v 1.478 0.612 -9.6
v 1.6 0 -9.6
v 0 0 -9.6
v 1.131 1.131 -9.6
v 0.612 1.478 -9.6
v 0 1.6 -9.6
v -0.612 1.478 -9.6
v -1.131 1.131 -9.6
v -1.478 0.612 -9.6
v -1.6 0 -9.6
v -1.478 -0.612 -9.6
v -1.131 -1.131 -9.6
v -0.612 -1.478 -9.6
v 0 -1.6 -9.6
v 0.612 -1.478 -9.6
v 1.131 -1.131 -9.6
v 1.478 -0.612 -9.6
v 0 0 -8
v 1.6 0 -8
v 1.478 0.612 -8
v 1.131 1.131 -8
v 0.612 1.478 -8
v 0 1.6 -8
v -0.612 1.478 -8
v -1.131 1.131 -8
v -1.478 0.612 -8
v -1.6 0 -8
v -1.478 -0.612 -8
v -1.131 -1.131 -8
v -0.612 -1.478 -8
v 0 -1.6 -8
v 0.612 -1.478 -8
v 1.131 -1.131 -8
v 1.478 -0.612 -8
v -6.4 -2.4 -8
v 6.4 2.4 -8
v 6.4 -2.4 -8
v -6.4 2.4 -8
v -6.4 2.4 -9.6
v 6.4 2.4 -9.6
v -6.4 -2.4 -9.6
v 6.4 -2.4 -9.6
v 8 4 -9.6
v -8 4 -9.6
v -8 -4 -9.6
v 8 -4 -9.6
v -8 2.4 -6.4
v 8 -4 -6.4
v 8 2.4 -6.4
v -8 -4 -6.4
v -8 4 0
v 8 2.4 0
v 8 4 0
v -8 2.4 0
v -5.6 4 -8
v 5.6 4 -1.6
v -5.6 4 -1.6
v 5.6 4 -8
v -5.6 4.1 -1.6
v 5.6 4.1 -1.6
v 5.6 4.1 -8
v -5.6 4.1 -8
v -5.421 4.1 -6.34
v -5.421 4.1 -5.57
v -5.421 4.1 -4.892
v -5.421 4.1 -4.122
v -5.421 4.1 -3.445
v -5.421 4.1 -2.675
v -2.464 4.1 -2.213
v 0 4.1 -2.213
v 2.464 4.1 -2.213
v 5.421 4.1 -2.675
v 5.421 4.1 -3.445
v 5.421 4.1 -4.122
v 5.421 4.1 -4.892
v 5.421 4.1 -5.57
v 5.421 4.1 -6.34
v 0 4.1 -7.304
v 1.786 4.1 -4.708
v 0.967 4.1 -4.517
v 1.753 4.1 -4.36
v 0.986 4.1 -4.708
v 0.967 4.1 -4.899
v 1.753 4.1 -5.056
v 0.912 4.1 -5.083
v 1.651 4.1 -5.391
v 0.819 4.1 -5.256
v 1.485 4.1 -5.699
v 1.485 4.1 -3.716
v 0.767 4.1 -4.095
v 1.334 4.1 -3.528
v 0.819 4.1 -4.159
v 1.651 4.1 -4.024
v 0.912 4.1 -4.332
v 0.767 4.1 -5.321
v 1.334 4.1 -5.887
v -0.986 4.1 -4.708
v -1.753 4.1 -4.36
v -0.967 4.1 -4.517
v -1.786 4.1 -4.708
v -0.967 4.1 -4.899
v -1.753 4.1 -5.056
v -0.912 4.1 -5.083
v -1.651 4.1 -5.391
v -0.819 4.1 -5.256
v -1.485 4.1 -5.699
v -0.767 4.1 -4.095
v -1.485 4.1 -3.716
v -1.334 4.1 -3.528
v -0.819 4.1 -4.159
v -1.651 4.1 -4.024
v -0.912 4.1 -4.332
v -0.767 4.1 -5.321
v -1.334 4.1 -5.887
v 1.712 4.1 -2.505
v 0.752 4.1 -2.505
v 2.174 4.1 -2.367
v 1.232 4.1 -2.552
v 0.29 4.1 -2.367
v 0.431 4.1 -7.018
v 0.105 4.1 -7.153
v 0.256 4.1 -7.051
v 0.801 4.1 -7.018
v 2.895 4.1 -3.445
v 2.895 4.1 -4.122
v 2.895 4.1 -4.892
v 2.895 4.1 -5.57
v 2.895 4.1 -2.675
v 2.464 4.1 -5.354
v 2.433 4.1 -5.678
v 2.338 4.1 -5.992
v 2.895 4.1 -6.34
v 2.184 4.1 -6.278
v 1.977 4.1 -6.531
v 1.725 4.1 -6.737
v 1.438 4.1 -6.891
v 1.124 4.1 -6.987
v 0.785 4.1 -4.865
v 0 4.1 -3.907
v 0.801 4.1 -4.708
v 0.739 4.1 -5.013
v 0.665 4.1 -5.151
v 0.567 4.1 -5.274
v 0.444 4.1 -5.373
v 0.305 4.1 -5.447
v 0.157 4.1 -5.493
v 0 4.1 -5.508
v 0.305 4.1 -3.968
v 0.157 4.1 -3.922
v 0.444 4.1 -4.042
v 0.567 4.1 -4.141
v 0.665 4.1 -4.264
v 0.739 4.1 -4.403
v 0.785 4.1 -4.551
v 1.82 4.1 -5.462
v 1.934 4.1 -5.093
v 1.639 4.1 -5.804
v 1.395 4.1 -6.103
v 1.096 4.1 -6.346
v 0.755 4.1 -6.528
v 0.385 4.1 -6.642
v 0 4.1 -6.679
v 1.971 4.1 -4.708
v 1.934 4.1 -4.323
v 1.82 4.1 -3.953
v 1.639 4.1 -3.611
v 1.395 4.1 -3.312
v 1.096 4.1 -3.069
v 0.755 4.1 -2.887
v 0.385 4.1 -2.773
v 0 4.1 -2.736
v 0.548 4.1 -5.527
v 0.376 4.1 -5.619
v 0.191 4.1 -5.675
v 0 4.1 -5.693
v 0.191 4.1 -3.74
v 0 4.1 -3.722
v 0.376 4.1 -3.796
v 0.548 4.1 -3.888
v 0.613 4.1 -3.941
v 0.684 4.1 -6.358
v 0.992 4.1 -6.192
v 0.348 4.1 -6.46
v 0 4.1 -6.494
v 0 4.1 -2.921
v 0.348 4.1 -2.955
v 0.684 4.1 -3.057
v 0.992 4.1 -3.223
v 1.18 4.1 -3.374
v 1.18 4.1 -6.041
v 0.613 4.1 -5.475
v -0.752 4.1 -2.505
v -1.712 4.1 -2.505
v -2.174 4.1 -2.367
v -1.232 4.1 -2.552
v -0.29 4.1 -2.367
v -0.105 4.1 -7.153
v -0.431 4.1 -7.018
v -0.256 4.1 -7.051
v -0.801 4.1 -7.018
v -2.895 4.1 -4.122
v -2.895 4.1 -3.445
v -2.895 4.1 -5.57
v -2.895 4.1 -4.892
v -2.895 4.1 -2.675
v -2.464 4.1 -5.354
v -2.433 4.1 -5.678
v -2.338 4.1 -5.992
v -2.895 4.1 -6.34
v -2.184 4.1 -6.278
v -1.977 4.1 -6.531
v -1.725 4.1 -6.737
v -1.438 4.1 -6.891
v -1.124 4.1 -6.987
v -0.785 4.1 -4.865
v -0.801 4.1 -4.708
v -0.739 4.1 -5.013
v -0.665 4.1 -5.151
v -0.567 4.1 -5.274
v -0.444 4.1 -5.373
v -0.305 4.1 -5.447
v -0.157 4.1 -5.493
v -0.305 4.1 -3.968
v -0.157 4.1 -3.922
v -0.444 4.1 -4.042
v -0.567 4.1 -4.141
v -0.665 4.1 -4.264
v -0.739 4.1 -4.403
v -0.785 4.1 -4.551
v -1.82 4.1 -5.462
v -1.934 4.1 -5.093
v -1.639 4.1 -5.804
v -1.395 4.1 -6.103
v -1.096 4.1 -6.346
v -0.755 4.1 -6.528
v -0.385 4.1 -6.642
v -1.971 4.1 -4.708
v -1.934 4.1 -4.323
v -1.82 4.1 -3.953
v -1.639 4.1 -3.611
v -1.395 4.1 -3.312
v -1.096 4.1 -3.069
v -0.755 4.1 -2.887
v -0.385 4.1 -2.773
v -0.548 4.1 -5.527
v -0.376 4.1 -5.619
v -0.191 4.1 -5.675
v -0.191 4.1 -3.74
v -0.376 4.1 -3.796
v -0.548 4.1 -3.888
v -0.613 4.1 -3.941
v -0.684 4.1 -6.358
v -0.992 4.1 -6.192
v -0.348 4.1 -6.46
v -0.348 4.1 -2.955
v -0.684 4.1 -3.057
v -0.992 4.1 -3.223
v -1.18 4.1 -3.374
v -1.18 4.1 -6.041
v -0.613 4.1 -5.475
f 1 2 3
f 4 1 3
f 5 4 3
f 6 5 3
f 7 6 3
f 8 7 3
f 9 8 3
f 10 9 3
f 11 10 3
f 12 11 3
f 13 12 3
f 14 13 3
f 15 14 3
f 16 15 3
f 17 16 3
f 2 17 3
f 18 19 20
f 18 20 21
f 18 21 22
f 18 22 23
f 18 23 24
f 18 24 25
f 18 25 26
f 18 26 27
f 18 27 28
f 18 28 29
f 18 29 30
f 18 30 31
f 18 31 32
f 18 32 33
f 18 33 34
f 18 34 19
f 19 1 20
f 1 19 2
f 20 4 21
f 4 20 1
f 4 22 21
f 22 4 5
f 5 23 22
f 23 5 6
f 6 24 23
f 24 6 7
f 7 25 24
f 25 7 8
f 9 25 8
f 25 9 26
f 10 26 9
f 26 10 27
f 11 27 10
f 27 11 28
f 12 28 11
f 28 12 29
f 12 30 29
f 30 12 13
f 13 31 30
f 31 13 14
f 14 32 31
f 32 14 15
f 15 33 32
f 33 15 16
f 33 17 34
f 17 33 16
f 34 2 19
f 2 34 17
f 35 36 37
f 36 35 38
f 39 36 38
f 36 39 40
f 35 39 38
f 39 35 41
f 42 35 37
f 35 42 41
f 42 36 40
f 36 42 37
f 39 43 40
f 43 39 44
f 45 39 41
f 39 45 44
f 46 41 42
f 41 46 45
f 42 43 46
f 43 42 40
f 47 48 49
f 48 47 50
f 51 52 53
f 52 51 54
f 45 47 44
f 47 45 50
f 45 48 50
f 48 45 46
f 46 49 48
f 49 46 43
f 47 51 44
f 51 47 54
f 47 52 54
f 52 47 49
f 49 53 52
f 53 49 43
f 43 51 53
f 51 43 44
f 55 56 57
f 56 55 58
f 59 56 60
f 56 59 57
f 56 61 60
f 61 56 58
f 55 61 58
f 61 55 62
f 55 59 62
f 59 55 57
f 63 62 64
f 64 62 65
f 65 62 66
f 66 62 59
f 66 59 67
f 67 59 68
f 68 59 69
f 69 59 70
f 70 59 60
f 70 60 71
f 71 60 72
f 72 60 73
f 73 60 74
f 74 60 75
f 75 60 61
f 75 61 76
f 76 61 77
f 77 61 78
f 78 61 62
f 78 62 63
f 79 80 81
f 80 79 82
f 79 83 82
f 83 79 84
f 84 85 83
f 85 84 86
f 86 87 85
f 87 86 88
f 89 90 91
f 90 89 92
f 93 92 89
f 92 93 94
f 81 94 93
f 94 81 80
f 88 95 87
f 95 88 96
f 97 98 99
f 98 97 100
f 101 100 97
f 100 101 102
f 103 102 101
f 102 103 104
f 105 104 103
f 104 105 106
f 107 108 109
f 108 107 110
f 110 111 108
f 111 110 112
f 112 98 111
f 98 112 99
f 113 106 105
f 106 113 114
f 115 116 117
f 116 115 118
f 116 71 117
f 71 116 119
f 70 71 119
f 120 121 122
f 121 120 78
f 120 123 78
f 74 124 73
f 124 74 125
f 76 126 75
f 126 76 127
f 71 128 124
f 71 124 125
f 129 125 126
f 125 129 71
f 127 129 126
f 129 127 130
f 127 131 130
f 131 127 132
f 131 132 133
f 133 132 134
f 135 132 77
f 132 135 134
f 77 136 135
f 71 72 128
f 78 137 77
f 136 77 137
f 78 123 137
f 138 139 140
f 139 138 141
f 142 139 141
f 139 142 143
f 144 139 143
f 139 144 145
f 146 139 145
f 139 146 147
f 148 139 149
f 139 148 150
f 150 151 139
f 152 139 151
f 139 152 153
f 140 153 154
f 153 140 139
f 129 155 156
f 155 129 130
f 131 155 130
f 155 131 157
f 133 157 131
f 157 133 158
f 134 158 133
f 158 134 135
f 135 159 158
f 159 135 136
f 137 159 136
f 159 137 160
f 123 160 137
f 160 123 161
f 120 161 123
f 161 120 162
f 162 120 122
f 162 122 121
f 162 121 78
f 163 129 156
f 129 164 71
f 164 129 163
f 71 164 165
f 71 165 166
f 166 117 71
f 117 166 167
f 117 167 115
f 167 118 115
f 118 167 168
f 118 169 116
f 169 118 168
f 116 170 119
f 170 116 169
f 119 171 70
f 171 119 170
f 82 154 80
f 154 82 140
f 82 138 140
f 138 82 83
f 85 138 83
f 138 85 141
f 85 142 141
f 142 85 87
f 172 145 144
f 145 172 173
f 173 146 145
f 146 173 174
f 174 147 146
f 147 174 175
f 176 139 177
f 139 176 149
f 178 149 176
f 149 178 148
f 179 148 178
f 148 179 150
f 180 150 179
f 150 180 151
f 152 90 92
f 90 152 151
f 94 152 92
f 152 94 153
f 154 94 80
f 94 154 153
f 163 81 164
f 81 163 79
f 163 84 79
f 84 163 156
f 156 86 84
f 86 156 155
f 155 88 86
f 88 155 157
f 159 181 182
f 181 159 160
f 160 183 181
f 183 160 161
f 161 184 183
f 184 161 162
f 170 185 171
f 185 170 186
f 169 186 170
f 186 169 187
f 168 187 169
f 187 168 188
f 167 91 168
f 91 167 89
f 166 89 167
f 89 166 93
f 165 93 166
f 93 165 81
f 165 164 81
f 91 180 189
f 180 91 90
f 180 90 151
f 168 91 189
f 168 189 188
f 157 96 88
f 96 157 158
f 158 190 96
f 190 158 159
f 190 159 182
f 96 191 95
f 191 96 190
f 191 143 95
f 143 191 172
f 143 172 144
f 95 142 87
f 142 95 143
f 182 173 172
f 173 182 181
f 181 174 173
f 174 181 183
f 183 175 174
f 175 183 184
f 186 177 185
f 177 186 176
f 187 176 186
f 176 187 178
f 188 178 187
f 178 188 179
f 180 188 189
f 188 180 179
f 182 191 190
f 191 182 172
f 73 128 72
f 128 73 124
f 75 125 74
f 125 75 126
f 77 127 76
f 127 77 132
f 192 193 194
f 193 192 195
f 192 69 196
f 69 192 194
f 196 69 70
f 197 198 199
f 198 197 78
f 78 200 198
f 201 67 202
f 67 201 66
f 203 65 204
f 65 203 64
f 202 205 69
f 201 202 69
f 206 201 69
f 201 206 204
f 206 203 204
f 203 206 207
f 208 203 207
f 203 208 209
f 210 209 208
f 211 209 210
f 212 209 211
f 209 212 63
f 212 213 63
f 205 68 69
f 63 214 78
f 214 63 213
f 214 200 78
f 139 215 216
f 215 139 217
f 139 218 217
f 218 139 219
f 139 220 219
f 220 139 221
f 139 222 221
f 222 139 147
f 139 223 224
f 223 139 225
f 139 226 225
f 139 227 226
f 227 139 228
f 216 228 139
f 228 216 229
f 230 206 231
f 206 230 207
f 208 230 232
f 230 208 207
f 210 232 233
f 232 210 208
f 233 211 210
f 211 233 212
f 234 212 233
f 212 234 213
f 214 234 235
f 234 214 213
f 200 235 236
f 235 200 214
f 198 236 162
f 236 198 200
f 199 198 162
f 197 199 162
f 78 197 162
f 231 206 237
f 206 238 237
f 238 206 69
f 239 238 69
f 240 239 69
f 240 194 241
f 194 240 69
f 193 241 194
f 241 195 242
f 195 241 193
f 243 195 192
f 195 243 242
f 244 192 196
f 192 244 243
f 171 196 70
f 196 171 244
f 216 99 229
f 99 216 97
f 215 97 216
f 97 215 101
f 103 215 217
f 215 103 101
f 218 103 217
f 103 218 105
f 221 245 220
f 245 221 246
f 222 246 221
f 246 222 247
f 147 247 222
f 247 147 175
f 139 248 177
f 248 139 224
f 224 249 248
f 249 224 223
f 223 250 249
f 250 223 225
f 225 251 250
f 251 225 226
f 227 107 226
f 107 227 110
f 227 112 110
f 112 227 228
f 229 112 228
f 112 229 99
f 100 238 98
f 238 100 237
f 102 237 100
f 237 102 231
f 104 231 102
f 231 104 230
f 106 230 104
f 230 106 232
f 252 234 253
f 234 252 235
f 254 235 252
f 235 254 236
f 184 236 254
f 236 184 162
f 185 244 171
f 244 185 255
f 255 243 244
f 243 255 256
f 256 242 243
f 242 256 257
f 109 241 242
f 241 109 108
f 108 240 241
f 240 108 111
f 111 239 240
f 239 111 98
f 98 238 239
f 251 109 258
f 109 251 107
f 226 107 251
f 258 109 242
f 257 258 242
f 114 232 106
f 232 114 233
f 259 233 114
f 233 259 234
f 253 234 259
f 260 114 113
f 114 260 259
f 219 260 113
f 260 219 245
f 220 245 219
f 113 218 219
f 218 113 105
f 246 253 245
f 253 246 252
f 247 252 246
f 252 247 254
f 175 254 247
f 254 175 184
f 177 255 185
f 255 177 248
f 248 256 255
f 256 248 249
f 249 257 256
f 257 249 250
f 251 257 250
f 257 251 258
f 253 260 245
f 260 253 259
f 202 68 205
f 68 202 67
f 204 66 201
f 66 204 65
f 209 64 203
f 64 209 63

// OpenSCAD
// file: ../p/4-4edge.scad
use <../lib.scad>
function ldraw_lib__4_4edge() = [
// 0 Circle 1.0
// 0 Name: 4-4edge.dat
// 0 Author: James Jessiman
// 0 !LDRAW_ORG Primitive UPDATE 2017-01
// 0 !LICENSE Licensed under CC BY 2.0 and CC BY 4.0 : see CAreadme.txt
// 
// 0 BFC CERTIFY CCW
  [0,"BFC","CERTIFY"],
  [0,"BFC","CCW"],
// 
// 0 !HISTORY 1998-12-15 [PTadmin] Official Update 1998-10
// 0 !HISTORY 2005-12-28 [PTadmin] Official Update 2005-01
// 0 !HISTORY 2007-06-24 [PTadmin] Header formatted for Contributor Agreement
// 0 !HISTORY 2008-07-01 [PTadmin] Official Update 2008-01
// 0 !HISTORY 2017-01-15 [Steffen] BFCed
// 0 !HISTORY 2017-12-30 [PTadmin] Official Update 2017-01
// 
// 
// 2 24 1 0 0 0.9239 0 0.3827
  [2,24,1,0,0,0.9239,0,0.3827],
// 2 24 0.9239 0 0.3827 0.7071 0 0.7071
  [2,24,0.9239,0,0.3827,0.7071,0,0.7071],
// 2 24 0.7071 0 0.7071 0.3827 0 0.9239
  [2,24,0.7071,0,0.7071,0.3827,0,0.9239],
// 2 24 0.3827 0 0.9239 0 0 1
  [2,24,0.3827,0,0.9239,0,0,1],
// 2 24 0 0 1 -0.3827 0 0.9239
  [2,24,0,0,1,-0.3827,0,0.9239],
// 2 24 -0.3827 0 0.9239 -0.7071 0 0.7071
  [2,24,-0.3827,0,0.9239,-0.7071,0,0.7071],
// 2 24 -0.7071 0 0.7071 -0.9239 0 0.3827
  [2,24,-0.7071,0,0.7071,-0.9239,0,0.3827],
// 2 24 -0.9239 0 0.3827 -1 0 -0
  [2,24,-0.9239,0,0.3827,-1,0,-0],
// 2 24 -1 0 -0 -0.9239 0 -0.3827
  [2,24,-1,0,-0,-0.9239,0,-0.3827],
// 2 24 -0.9239 0 -0.3827 -0.7071 0 -0.7071
  [2,24,-0.9239,0,-0.3827,-0.7071,0,-0.7071],
// 2 24 -0.7071 0 -0.7071 -0.3827 0 -0.9239
  [2,24,-0.7071,0,-0.7071,-0.3827,0,-0.9239],
// 2 24 -0.3827 0 -0.9239 0 0 -1
  [2,24,-0.3827,0,-0.9239,0,0,-1],
// 2 24 0 0 -1 0.3827 0 -0.9239
  [2,24,0,0,-1,0.3827,0,-0.9239],
// 2 24 0.3827 0 -0.9239 0.7071 0 -0.7071
  [2,24,0.3827,0,-0.9239,0.7071,0,-0.7071],
// 2 24 0.7071 0 -0.7071 0.9239 0 -0.3827
  [2,24,0.7071,0,-0.7071,0.9239,0,-0.3827],
// 2 24 0.9239 0 -0.3827 1 0 0
  [2,24,0.9239,0,-0.3827,1,0,0],
];
module ldraw_lib__4_4edge(step=0, col=false, unit=2/5, alt=false, line=0.2, solid=!$preview)
    makepoly(ldraw_lib__4_4edge(), step=step, col=col, unit=unit, alt=alt, line=line, solid=solid);
ldraw_lib__4_4edge(line=0.2);
// file: ../p/4-4disc.scad
use <../lib.scad>
function ldraw_lib__4_4disc() = [
// 0 Disc 1.0
// 0 Name: 4-4disc.dat
// 0 Author: James Jessiman
// 0 !LDRAW_ORG Primitive UPDATE 2002-02
// 0 !LICENSE Licensed under CC BY 2.0 and CC BY 4.0 : see CAreadme.txt
// 
// 0 BFC CERTIFY CCW
  [0,"BFC","CERTIFY"],
  [0,"BFC","CCW"],
// 
// 0 !HISTORY 1998-12-15 [PTadmin] Official Update 1998-10
// 0 !HISTORY 2002-03-23 [sbliss] Added BFC statement
// 0 !HISTORY 2002-04-25 [PTadmin] Official Update 2002-02
// 0 !HISTORY 2007-06-24 [PTadmin] Header formatted for Contributor Agreement
// 0 !HISTORY 2008-07-01 [PTadmin] Official Update 2008-01
// 
// 
// 3 16 0 0 0 1 0 0 0.9239 0 0.3827
  [3,16,0,0,0,1,0,0,0.9239,0,0.3827],
// 3 16 0 0 0 0.9239 0 0.3827 0.7071 0 0.7071
  [3,16,0,0,0,0.9239,0,0.3827,0.7071,0,0.7071],
// 3 16 0 0 0 0.7071 0 0.7071 0.3827 0 0.9239
  [3,16,0,0,0,0.7071,0,0.7071,0.3827,0,0.9239],
// 3 16 0 0 0 0.3827 0 0.9239 0 0 1
  [3,16,0,0,0,0.3827,0,0.9239,0,0,1],
// 3 16 0 0 0 0 0 1 -0.3827 0 0.9239
  [3,16,0,0,0,0,0,1,-0.3827,0,0.9239],
// 3 16 0 0 0 -0.3827 0 0.9239 -0.7071 0 0.7071
  [3,16,0,0,0,-0.3827,0,0.9239,-0.7071,0,0.7071],
// 3 16 0 0 0 -0.7071 0 0.7071 -0.9239 0 0.3827
  [3,16,0,0,0,-0.7071,0,0.7071,-0.9239,0,0.3827],
// 3 16 0 0 0 -0.9239 0 0.3827 -1 0 -0
  [3,16,0,0,0,-0.9239,0,0.3827,-1,0,-0],
// 3 16 0 0 0 -1 0 -0 -0.9239 0 -0.3827
  [3,16,0,0,0,-1,0,-0,-0.9239,0,-0.3827],
// 3 16 0 0 0 -0.9239 0 -0.3827 -0.7071 0 -0.7071
  [3,16,0,0,0,-0.9239,0,-0.3827,-0.7071,0,-0.7071],
// 3 16 0 0 0 -0.7071 0 -0.7071 -0.3827 0 -0.9239
  [3,16,0,0,0,-0.7071,0,-0.7071,-0.3827,0,-0.9239],
// 3 16 0 0 0 -0.3827 0 -0.9239 0 0 -1
  [3,16,0,0,0,-0.3827,0,-0.9239,0,0,-1],
// 3 16 0 0 0 0 0 -1 0.3827 0 -0.9239
  [3,16,0,0,0,0,0,-1,0.3827,0,-0.9239],
// 3 16 0 0 0 0.3827 0 -0.9239 0.7071 0 -0.7071
  [3,16,0,0,0,0.3827,0,-0.9239,0.7071,0,-0.7071],
// 3 16 0 0 0 0.7071 0 -0.7071 0.9239 0 -0.3827
  [3,16,0,0,0,0.7071,0,-0.7071,0.9239,0,-0.3827],
// 3 16 0 0 0 0.9239 0 -0.3827 1 0 0
  [3,16,0,0,0,0.9239,0,-0.3827,1,0,0],
// 0
];
module ldraw_lib__4_4disc(step=0, col=false, unit=2/5, alt=false, line=0.2, solid=!$preview)
    makepoly(ldraw_lib__4_4disc(), step=step, col=col, unit=unit, alt=alt, line=line, solid=solid);
ldraw_lib__4_4disc(line=0.2);
// file: ../p/4-4cyli.scad
use <../lib.scad>
$fa=1; $fs=0.2;
function ldraw_lib__4_4cyli(realsolid=false) = [
// 0 Cylinder 1.0
// 0 Name: 4-4cyli.dat
// 0 Author: James Jessiman
// 0 !LDRAW_ORG Primitive UPDATE 2005-01
// 0 !LICENSE Licensed under CC BY 2.0 and CC BY 4.0 : see CAreadme.txt
// 
// 0 BFC CERTIFY CCW
  [0,"BFC","CERTIFY"],
  [0,"BFC","CCW"],
// 
// 0 !HISTORY 1998-12-15 [PTadmin] Official Update 1998-10
// 0 !HISTORY 2002-03-23 [sbliss] Added BFC statement; merged headers from files in distributions LDraw 0.27 and Complete.
// 0 !HISTORY 2002-04-25 [PTadmin] Official Update 2002-02
// 0 !HISTORY 2004-12-14 [guyvivan] BFC CCW
// 0 !HISTORY 2005-12-28 [PTadmin] Official Update 2005-01
// 0 !HISTORY 2007-06-24 [PTadmin] Header formatted for Contributor Agreement
// 0 !HISTORY 2008-07-01 [PTadmin] Official Update 2008-01
// 
// 
// 4 16 1 1 0 0.9239 1 0.3827 0.9239 0 0.3827 1 0 0
  [4,16,1,1,0,0.9239,1,0.3827,0.9239,0,0.3827,1,0,0],
// 5 24 1 0 0 1 1 0 0.9239 0 0.3827 0.9239 0 -0.3827
  [5,24,1,0,0,1,1,0,0.9239,0,0.3827,0.9239,0,-0.3827],
// 4 16 0.9239 1 0.3827 0.7071 1 0.7071 0.7071 0 0.7071 0.9239 0 0.3827
  [4,16,0.9239,1,0.3827,0.7071,1,0.7071,0.7071,0,0.7071,0.9239,0,0.3827],
// 5 24 0.9239 0 0.3827 0.9239 1 0.3827 0.7071 0 0.7071 1 0 0
  [5,24,0.9239,0,0.3827,0.9239,1,0.3827,0.7071,0,0.7071,1,0,0],
// 4 16 0.7071 1 0.7071 0.3827 1 0.9239 0.3827 0 0.9239 0.7071 0 0.7071
  [4,16,0.7071,1,0.7071,0.3827,1,0.9239,0.3827,0,0.9239,0.7071,0,0.7071],
// 5 24 0.7071 0 0.7071 0.7071 1 0.7071 0.3827 0 0.9239 0.9239 0 0.3827
  [5,24,0.7071,0,0.7071,0.7071,1,0.7071,0.3827,0,0.9239,0.9239,0,0.3827],
// 4 16 0.3827 1 0.9239 0 1 1 0 0 1 0.3827 0 0.9239
  [4,16,0.3827,1,0.9239,0,1,1,0,0,1,0.3827,0,0.9239],
// 5 24 0.3827 0 0.9239 0.3827 1 0.9239 0 0 1 0.7071 0 0.7071
  [5,24,0.3827,0,0.9239,0.3827,1,0.9239,0,0,1,0.7071,0,0.7071],
// 4 16 0 1 1 -0.3827 1 0.9239 -0.3827 0 0.9239 0 0 1
  [4,16,0,1,1,-0.3827,1,0.9239,-0.3827,0,0.9239,0,0,1],
// 5 24 0 0 1 0 1 1 -0.3827 0 0.9239 0.3827 0 0.9239
  [5,24,0,0,1,0,1,1,-0.3827,0,0.9239,0.3827,0,0.9239],
// 4 16 -0.3827 1 0.9239 -0.7071 1 0.7071 -0.7071 0 0.7071 -0.3827 0 0.9239
  [4,16,-0.3827,1,0.9239,-0.7071,1,0.7071,-0.7071,0,0.7071,-0.3827,0,0.9239],
// 5 24 -0.3827 0 0.9239 -0.3827 1 0.9239 -0.7071 0 0.7071 0 0 1
  [5,24,-0.3827,0,0.9239,-0.3827,1,0.9239,-0.7071,0,0.7071,0,0,1],
// 4 16 -0.7071 1 0.7071 -0.9239 1 0.3827 -0.9239 0 0.3827 -0.7071 0 0.7071
  [4,16,-0.7071,1,0.7071,-0.9239,1,0.3827,-0.9239,0,0.3827,-0.7071,0,0.7071],
// 5 24 -0.7071 0 0.7071 -0.7071 1 0.7071 -0.9239 0 0.3827 -0.3827 0 0.9239
  [5,24,-0.7071,0,0.7071,-0.7071,1,0.7071,-0.9239,0,0.3827,-0.3827,0,0.9239],
// 4 16 -0.9239 1 0.3827 -1 1 0 -1 0 0 -0.9239 0 0.3827
  [4,16,-0.9239,1,0.3827,-1,1,0,-1,0,0,-0.9239,0,0.3827],
// 5 24 -0.9239 0 0.3827 -0.9239 1 0.3827 -1 0 0 -0.7071 0 0.7071
  [5,24,-0.9239,0,0.3827,-0.9239,1,0.3827,-1,0,0,-0.7071,0,0.7071],
// 4 16 -1 1 0 -0.9239 1 -0.3827 -0.9239 0 -0.3827 -1 0 0
  [4,16,-1,1,0,-0.9239,1,-0.3827,-0.9239,0,-0.3827,-1,0,0],
// 5 24 -1 0 0 -1 1 0 -0.9239 0 -0.3827 -0.9239 0 0.3827
  [5,24,-1,0,0,-1,1,0,-0.9239,0,-0.3827,-0.9239,0,0.3827],
// 4 16 -0.9239 1 -0.3827 -0.7071 1 -0.7071 -0.7071 0 -0.7071 -0.9239 0 -0.3827
  [4,16,-0.9239,1,-0.3827,-0.7071,1,-0.7071,-0.7071,0,-0.7071,-0.9239,0,-0.3827],
// 5 24 -0.9239 0 -0.3827 -0.9239 1 -0.3827 -0.7071 0 -0.7071 -1 0 0
  [5,24,-0.9239,0,-0.3827,-0.9239,1,-0.3827,-0.7071,0,-0.7071,-1,0,0],
// 4 16 -0.7071 1 -0.7071 -0.3827 1 -0.9239 -0.3827 0 -0.9239 -0.7071 0 -0.7071
  [4,16,-0.7071,1,-0.7071,-0.3827,1,-0.9239,-0.3827,0,-0.9239,-0.7071,0,-0.7071],
// 5 24 -0.7071 0 -0.7071 -0.7071 1 -0.7071 -0.3827 0 -0.9239 -0.9239 0 -0.3827
  [5,24,-0.7071,0,-0.7071,-0.7071,1,-0.7071,-0.3827,0,-0.9239,-0.9239,0,-0.3827],
// 4 16 -0.3827 1 -0.9239 0 1 -1 0 0 -1 -0.3827 0 -0.9239
  [4,16,-0.3827,1,-0.9239,0,1,-1,0,0,-1,-0.3827,0,-0.9239],
// 5 24 -0.3827 0 -0.9239 -0.3827 1 -0.9239 0 0 -1 -0.7071 0 -0.7071
  [5,24,-0.3827,0,-0.9239,-0.3827,1,-0.9239,0,0,-1,-0.7071,0,-0.7071],
// 4 16 0 1 -1 0.3827 1 -0.9239 0.3827 0 -0.9239 0 0 -1
  [4,16,0,1,-1,0.3827,1,-0.9239,0.3827,0,-0.9239,0,0,-1],
// 5 24 0 0 -1 0 1 -1 0.3827 0 -0.9239 -0.3827 0 -0.9239
  [5,24,0,0,-1,0,1,-1,0.3827,0,-0.9239,-0.3827,0,-0.9239],
// 4 16 0.3827 1 -0.9239 0.7071 1 -0.7071 0.7071 0 -0.7071 0.3827 0 -0.9239
  [4,16,0.3827,1,-0.9239,0.7071,1,-0.7071,0.7071,0,-0.7071,0.3827,0,-0.9239],
// 5 24 0.3827 0 -0.9239 0.3827 1 -0.9239 0.7071 0 -0.7071 0 0 -1
  [5,24,0.3827,0,-0.9239,0.3827,1,-0.9239,0.7071,0,-0.7071,0,0,-1],
// 4 16 0.7071 1 -0.7071 0.9239 1 -0.3827 0.9239 0 -0.3827 0.7071 0 -0.7071
  [4,16,0.7071,1,-0.7071,0.9239,1,-0.3827,0.9239,0,-0.3827,0.7071,0,-0.7071],
// 5 24 0.7071 0 -0.7071 0.7071 1 -0.7071 0.9239 0 -0.3827 0.3827 0 -0.9239
  [5,24,0.7071,0,-0.7071,0.7071,1,-0.7071,0.9239,0,-0.3827,0.3827,0,-0.9239],
// 4 16 0.9239 1 -0.3827 1 1 0 1 0 0 0.9239 0 -0.3827
  [4,16,0.9239,1,-0.3827,1,1,0,1,0,0,0.9239,0,-0.3827],
// 5 24 0.9239 0 -0.3827 0.9239 1 -0.3827 1 0 0 0.7071 0 -0.7071
  [5,24,0.9239,0,-0.3827,0.9239,1,-0.3827,1,0,0,0.7071,0,-0.7071],
// 0
];
module ldraw_lib__4_4cyli(step=0, col=false, unit=2/5, alt=false, line=0.2, solid=!$preview)
    makepoly(ldraw_lib__4_4cyli(solid), step=step, col=col, unit=unit, alt=alt, line=line, solid=solid);
ldraw_lib__4_4cyli(line=0.2);
// file: ../p/stud3.scad
use <../lib.scad>
use <4-4cyli.scad>
use <4-4disc.scad>
use <4-4edge.scad>
function ldraw_lib__stud3() = [
// 0 Stud Tube Solid
// 0 Name: stud3.dat
// 0 Author: James Jessiman
// 0 !LDRAW_ORG Primitive UPDATE 2012-01
// 0 !LICENSE Licensed under CC BY 4.0 : see CAreadme.txt
// 
// 0 BFC CERTIFY CCW
  [0,"BFC","CERTIFY"],
  [0,"BFC","CCW"],
// 
// 0 !HISTORY 2002-04-04 [sbliss] Modified for BFC compliance
// 0 !HISTORY 2002-04-25 [PTadmin] Official Update 2002-02
// 0 !HISTORY 2007-06-24 [PTadmin] Header formatted for Contributor Agreement
// 0 !HISTORY 2008-07-01 [PTadmin] Official Update 2008-01
// 0 !HISTORY 2012-02-16 [Philo] Changed to CCW
// 0 !HISTORY 2012-03-30 [PTadmin] Official Update 2012-01
// 
// 
// 1 16 0 -4 0 4 0 0 0 1 0 0 0 4 4-4edge.dat
  [1,16,0,-4,0,4,0,0,0,1,0,0,0,4, ldraw_lib__4_4edge()],
// 1 16 0 0 0 4 0 0 0 1 0 0 0 4 4-4edge.dat
  [1,16,0,0,0,4,0,0,0,1,0,0,0,4, ldraw_lib__4_4edge()],
// 1 16 0 -4 0 4 0 0 0 1 0 0 0 4 4-4disc.dat
  [1,16,0,-4,0,4,0,0,0,1,0,0,0,4, ldraw_lib__4_4disc()],
  [-1,16,0,0,0,4,0,0,0,-1,0,0,0,4, ldraw_lib__4_4disc()],
// 1 16 0 -4 0 4 0 0 0 4 0 0 0 4 4-4cyli.dat
  [1,16,0,-4,0,4,0,0,0,4,0,0,0,4, ldraw_lib__4_4cyli()],
];
module ldraw_lib__stud3(step=0, col=false, unit=2/5, alt=false, line=0.2, solid=!$preview)
    makepoly(ldraw_lib__stud3(), step=step, col=col, unit=unit, alt=alt, line=line, solid=solid);
ldraw_lib__stud3(line=0.2);
// file: ../p/box5.scad
use <../lib.scad>
function ldraw_lib__box5() = [
// 0 Box with 5 Faces and All Edges
// 0 Name: box5.dat
// 0 Author: James Jessiman
// 0 !LDRAW_ORG Primitive UPDATE 2012-01
// 0 !LICENSE Licensed under CC BY 2.0 and CC BY 4.0 : see CAreadme.txt
// 
// 0 BFC CERTIFY CCW
  [0,"BFC","CERTIFY"],
  [0,"BFC","CCW"],
// 
// 0 !HISTORY 2002-04-03 [sbliss] Modified for BFC compliance
// 0 !HISTORY 2002-04-25 [PTadmin] Official Update 2002-02
// 0 !HISTORY 2007-06-24 [PTadmin] Header formatted for Contributor Agreement
// 0 !HISTORY 2008-07-01 [PTadmin] Official Update 2008-01
// 0 !HISTORY 2012-02-16 [Philo] Changed to CCW
// 0 !HISTORY 2012-03-30 [PTadmin] Official Update 2012-01
// 
// 
// 2 24 1 1 1 -1 1 1
  [2,24,1,1,1,-1,1,1],
// 2 24 -1 1 1 -1 1 -1
  [2,24,-1,1,1,-1,1,-1],
// 2 24 -1 1 -1 1 1 -1
  [2,24,-1,1,-1,1,1,-1],
// 2 24 1 1 -1 1 1 1
  [2,24,1,1,-1,1,1,1],
// 2 24 1 0 1 -1 0 1
  [2,24,1,0,1,-1,0,1],
// 2 24 -1 0 1 -1 0 -1
  [2,24,-1,0,1,-1,0,-1],
// 2 24 -1 0 -1 1 0 -1
  [2,24,-1,0,-1,1,0,-1],
// 2 24 1 0 -1 1 0 1
  [2,24,1,0,-1,1,0,1],
// 2 24 1 0 1 1 1 1
  [2,24,1,0,1,1,1,1],
// 2 24 -1 0 1 -1 1 1
  [2,24,-1,0,1,-1,1,1],
// 2 24 1 0 -1 1 1 -1
  [2,24,1,0,-1,1,1,-1],
// 2 24 -1 0 -1 -1 1 -1
  [2,24,-1,0,-1,-1,1,-1],
// 4 16 -1 1 1 1 1 1 1 1 -1 -1 1 -1
  [4,16,-1,1,1,1,1,1,1,1,-1,-1,1,-1],
// 4 16 -1 1 1 -1 0 1 1 0 1 1 1 1
  [4,16,-1,1,1,-1,0,1,1,0,1,1,1,1],
// 4 16 -1 1 -1 -1 0 -1 -1 0 1 -1 1 1
  [4,16,-1,1,-1,-1,0,-1,-1,0,1,-1,1,1],
// 4 16 1 1 -1 1 0 -1 -1 0 -1 -1 1 -1
  [4,16,1,1,-1,1,0,-1,-1,0,-1,-1,1,-1],
// 4 16 1 1 1 1 0 1 1 0 -1 1 1 -1
  [4,16,1,1,1,1,0,1,1,0,-1,1,1,-1],
];
makepoly(ldraw_lib__box5(), line=0.2);
// file: s/4865as01.scad
use <../../lib.scad>
use <../../p/box5.scad>
use <../../p/stud3.scad>
function ldraw_lib__s__4865as01() = [
// 0 ~Panel  1 x  2 x  1 without Front Face
// 0 Name: s\4865as01.dat
// 0 Author: James Jessiman
// 0 !LDRAW_ORG Subpart UPDATE 2020-03
// 0 !LICENSE Licensed under CC BY 2.0 and CC BY 4.0 : see CAreadme.txt
// 
// 0 BFC CERTIFY CCW
  [0,"BFC","CERTIFY"],
  [0,"BFC","CCW"],
// 
// 0 !HISTORY 2003-07-03 [Steffen] BFCed, subfiled
// 0 !HISTORY 2004-04-22 [PTadmin] Official Update 2004-02
// 0 !HISTORY 2007-09-10 [PTadmin] Header formatted for Contributor Agreement
// 0 !HISTORY 2008-07-01 [PTadmin] Official Update 2008-01
// 0 !HISTORY 2020-07-14 [PTadmin] Renamed from s/4865s01
// 0 !HISTORY 2020-12-29 [PTadmin] Official Update 2020-03
// 
// 
// 1 16 0 20 0 1 0 0 0 -1 0 0 0 1 stud3.dat
  [1,16,0,20,0,1,0,0,0,-1,0,0,0,1, ldraw_lib__stud3()],
// 0 BFC INVERTNEXT
  [0,"BFC","INVERTNEXT"],
// 1 16 0 24 0 16 0 0 0 -4 0 0 0 6 box5.dat
  [1,16,0,24,0,16,0,0,0,-4,0,0,0,6, ldraw_lib__box5()],
// 4 16 20 24 10 16 24 6 -16 24 6 -20 24 10
  [4,16,20,24,10,16,24,6,-16,24,6,-20,24,10],
// 4 16 -20 24 10 -16 24 6 -16 24 -6 -20 24 -10
  [4,16,-20,24,10,-16,24,6,-16,24,-6,-20,24,-10],
// 4 16 -20 24 -10 -16 24 -6 16 24 -6 20 24 -10
  [4,16,-20,24,-10,-16,24,-6,16,24,-6,20,24,-10],
// 4 16 20 24 -10 16 24 -6 16 24 6 20 24 10
  [4,16,20,24,-10,16,24,-6,16,24,6,20,24,10],
// 2 24 20 24 10 -20 24 10
  [2,24,20,24,10,-20,24,10],
// 2 24 -20 24 10 -20 24 -10
  [2,24,-20,24,10,-20,24,-10],
// 2 24 -20 24 -10 20 24 -10
  [2,24,-20,24,-10,20,24,-10],
// 2 24 20 24 -10 20 24 10
  [2,24,20,24,-10,20,24,10],
// 2 24 20 16 6 -20 16 6
  [2,24,20,16,6,-20,16,6],
// 2 24 -20 16 6 -20 16 -10
  [2,24,-20,16,6,-20,16,-10],
// 2 24 -20 16 -10 20 16 -10
  [2,24,-20,16,-10,20,16,-10],
// 2 24 20 16 -10 20 16 6
  [2,24,20,16,-10,20,16,6],
// 2 24 20 0 10 -20 0 10
  [2,24,20,0,10,-20,0,10],
// 2 24 -20 0 10 -20 0 6
  [2,24,-20,0,10,-20,0,6],
// 2 24 -20 0 6 20 0 6
  [2,24,-20,0,6,20,0,6],
// 2 24 20 0 6 20 0 10
  [2,24,20,0,6,20,0,10],
// 2 24 20 0 6 20 16 6
  [2,24,20,0,6,20,16,6],
// 2 24 -20 0 6 -20 16 6
  [2,24,-20,0,6,-20,16,6],
// 2 24 20 16 -10 20 24 -10
  [2,24,20,16,-10,20,24,-10],
// 2 24 -20 16 -10 -20 24 -10
  [2,24,-20,16,-10,-20,24,-10],
// 2 24 20 0 10 20 24 10
  [2,24,20,0,10,20,24,10],
// 2 24 -20 0 10 -20 24 10
  [2,24,-20,0,10,-20,24,10],
// 4 16 20 16 -10 20 16 6 -20 16 6 -20 16 -10
  [4,16,20,16,-10,20,16,6,-20,16,6,-20,16,-10],
// 4 16 20 0 6 20 0 10 -20 0 10 -20 0 6
  [4,16,20,0,6,20,0,10,-20,0,10,-20,0,6],
// 4 16 -20 24 10 -20 24 -10 -20 16 -10 -20 16 6
  [4,16,-20,24,10,-20,24,-10,-20,16,-10,-20,16,6],
// 4 16 -20 24 -10 20 24 -10 20 16 -10 -20 16 -10
  [4,16,-20,24,-10,20,24,-10,20,16,-10,-20,16,-10],
// 4 16 20 24 -10 20 24 10 20 16 6 20 16 -10
  [4,16,20,24,-10,20,24,10,20,16,6,20,16,-10],
// 4 16 -20 24 10 -20 16 6 -20 0 6 -20 0 10
  [4,16,-20,24,10,-20,16,6,-20,0,6,-20,0,10],
// 4 16 -20 16 6 20 16 6 20 0 6 -20 0 6
  [4,16,-20,16,6,20,16,6,20,0,6,-20,0,6],
// 4 16 20 16 6 20 24 10 20 0 10 20 0 6
  [4,16,20,16,6,20,24,10,20,0,10,20,0,6],
// 0
];
makepoly(ldraw_lib__s__4865as01(), line=0.2);
// file: s/169625as02.scad
use <../../lib.scad>
function ldraw_lib__s__169625as02() = [
// 0 ~Coast Guard (1995) Logo with Three Red Horizontal Stripes and Life Saver on Blue Crest - Quarter of Life Saver
// 0 Name: s\169625as02.dat
// 0 Author: Max Martin Richter [MMR1988]
// 0 !LDRAW_ORG Subpart UPDATE 2024-08
// 0 !LICENSE Licensed under CC BY 4.0 : see CAreadme.txt
// 
// 0 BFC CERTIFY CCW
  [0,"BFC","CERTIFY"],
  [0,"BFC","CCW"],
// 
// 0 !HISTORY 2024-09-30 [OrionP] Official Update 2024-08
// 
// 
// 4 16 -3.2 0 .3 -3.14 0 .92 -5.69 0 1.43 -5.8 0 .3
  [4,16,-3.2,0,.3,-3.14,0,.92,-5.69,0,1.43,-5.8,0,.3],
// 4 16 -3.14 0 -.32 -3.2 0 .3 -5.8 0 .3 -5.69 0 -.83
  [4,16,-3.14,0,-.32,-3.2,0,.3,-5.8,0,.3,-5.69,0,-.83],
// 4 16 -2.96 0 -.92 -3.14 0 -.32 -5.69 0 -.83 -5.36 0 -1.92
  [4,16,-2.96,0,-.92,-3.14,0,-.32,-5.69,0,-.83,-5.36,0,-1.92],
// 4 16 -2.66 0 -1.48 -2.96 0 -.92 -5.36 0 -1.92 -4.82 0 -2.92
  [4,16,-2.66,0,-1.48,-2.96,0,-.92,-5.36,0,-1.92,-4.82,0,-2.92],
// 4 16 -2.66 0 2.08 -2.49 0 2.29 -4.33 0 4.13 -4.82 0 3.52
  [4,16,-2.66,0,2.08,-2.49,0,2.29,-4.33,0,4.13,-4.82,0,3.52],
// 4 16 -2.96 0 1.52 -2.66 0 2.08 -4.82 0 3.52 -5.36 0 2.52
  [4,16,-2.96,0,1.52,-2.66,0,2.08,-4.82,0,3.52,-5.36,0,2.52],
// 4 16 -3.14 0 .92 -2.96 0 1.52 -5.36 0 2.52 -5.69 0 1.43
  [4,16,-3.14,0,.92,-2.96,0,1.52,-5.36,0,2.52,-5.69,0,1.43],
// 4 16 -4.33 0 -3.53 -2.49 0 -1.69 -2.66 0 -1.48 -4.82 0 -2.92
  [4,16,-4.33,0,-3.53,-2.49,0,-1.69,-2.66,0,-1.48,-4.82,0,-2.92],
];
module ldraw_lib__s__169625as02(step=0, col=false, unit=2/5, alt=false, line=0.2, solid=!$preview)
    makepoly(ldraw_lib__s__169625as02(), step=step, col=col, unit=unit, alt=alt, line=line, solid=solid);
ldraw_lib__s__169625as02(line=0.2);
// file: ../p/box5-12.scad
use <../lib.scad>
function ldraw_lib__box5_12() = [
// 0 Box with 5 Faces without Any Edges
// 0 Name: box5-12.dat
// 0 Author: Chris Dee [cwdee]
// 0 !LDRAW_ORG Primitive UPDATE 2009-02
// 0 !LICENSE Licensed under CC BY 2.0 and CC BY 4.0 : see CAreadme.txt
// 
// 0 BFC CERTIFY CCW
  [0,"BFC","CERTIFY"],
  [0,"BFC","CCW"],
// 
// 0 !HISTORY 2009-09-03 [PTadmin] Official Update 2009-02
// 
// 
// 4 16 1 1 1 1 1 -1 -1 1 -1 -1 1 1
  [4,16,1,1,1,1,1,-1,-1,1,-1,-1,1,1],
// 4 16 -1 0 1 1 0 1 1 1 1 -1 1 1
  [4,16,-1,0,1,1,0,1,1,1,1,-1,1,1],
// 4 16 -1 0 -1 -1 0 1 -1 1 1 -1 1 -1
  [4,16,-1,0,-1,-1,0,1,-1,1,1,-1,1,-1],
// 4 16 1 0 -1 -1 0 -1 -1 1 -1 1 1 -1
  [4,16,1,0,-1,-1,0,-1,-1,1,-1,1,1,-1],
// 4 16 1 0 1 1 0 -1 1 1 -1 1 1 1
  [4,16,1,0,1,1,0,-1,1,1,-1,1,1,1],
// 0
];
module ldraw_lib__box5_12(step=0, col=false, unit=2/5, alt=false, line=0.2, solid=!$preview)
    makepoly(ldraw_lib__box5_12(), step=step, col=col, unit=unit, alt=alt, line=line, solid=solid);
ldraw_lib__box5_12(line=0.2);
// file: 4865a.scad
use <../lib.scad>
use <s/4865as01.scad>
function ldraw_lib__4865a() = [
// 0 Panel  1 x  2 x  1 with Square Corners
// 0 Name: 4865a.dat
// 0 Author: James Jessiman
// 0 !LDRAW_ORG Part UPDATE 2020-03
// 0 !LICENSE Licensed under CC BY 2.0 and CC BY 4.0 : see CAreadme.txt
// 
// 0 BFC CERTIFY CCW
  [0,"BFC","CERTIFY"],
  [0,"BFC","CCW"],
// 
// 0 !HISTORY 2003-07-03 [Steffen] BFCed, subfiled
// 0 !HISTORY 2004-04-22 [PTadmin] Official Update 2004-02
// 0 !HISTORY 2007-07-09 [PTadmin] Header formatted for Contributor Agreement
// 0 !HISTORY 2008-07-01 [PTadmin] Official Update 2008-01
// 0 !HISTORY 2011-12-08 [PTadmin] Renamed from 4865
// 0 !HISTORY 2011-12-29 [PTadmin] Official Update 2011-02
// 0 !HISTORY 2020-08-01 [cwdee] Use renamed subfile
// 0 !HISTORY 2020-12-29 [PTadmin] Official Update 2020-03
// 
// 
// 1 16 0 0 0 1 0 0 0 1 0 0 0 1 s\4865as01.dat
  [1,16,0,0,0,1,0,0,0,1,0,0,0,1, ldraw_lib__s__4865as01()],
// 4 16 20 24 10 -20 24 10 -20 0 10 20 0 10
  [4,16,20,24,10,-20,24,10,-20,0,10,20,0,10],
// 
];
module ldraw_lib__4865a(step=0, col=false, unit=2/5, alt=false, line=0.2, solid=!$preview)
    makepoly(ldraw_lib__4865a(), step=step, col=col, unit=unit, alt=alt, line=line, solid=solid);
ldraw_lib__4865a(line=0.2);
// file: 169625a.scad
use <../lib.scad>
use <../p/box5-12.scad>
use <s/169625as01.scad>
use <s/169625as02.scad>
function ldraw_lib__169625a() = [
// 0 Sticker  0.8 x  1.4 with Coast Guard (1995) Logo
// 0 Name: 169625a.dat
// 0 Author: Gerald Lasser [GeraldLasser]
// 0 !LDRAW_ORG Part UPDATE 2024-08
// 0 !LICENSE Licensed under CC BY 4.0 : see CAreadme.txt
// 
// 0 BFC CERTIFY CCW
  [0,"BFC","CERTIFY"],
  [0,"BFC","CCW"],
// 
// 0 !KEYWORDS Bricklink 6338stk01, Brickowl 143926, Rebrickable 169625, Set 6338
// 
// 0 !HISTORY 2022-12-31 [MMR1988] Used s02 for correct colouring, removed NOCLIP statement
// 0 !HISTORY 2024-09-30 [OrionP] Official Update 2024-08
// 
// 
// 1 16 0 -.25 0 14 0 0 0 .25 0 0 0 8 box5-12.dat
  [1,16,0,-.25,0,14,0,0,0,.25,0,0,0,8, ldraw_lib__box5_12()],
// 
// 3 16 13.552 -.25 -3.85 14 -.25 -8 13.552 -.25 -1.925
  [3,16,13.552,-.25,-3.85,14,-.25,-8,13.552,-.25,-1.925],
// 3 16 13.552 -.25 -1.925 14 -.25 -8 13.552 -.25 -.231
  [3,16,13.552,-.25,-1.925,14,-.25,-8,13.552,-.25,-.231],
// 3 16 13.552 -.25 -.231 14 -.25 -8 13.552 -.25 1.694
  [3,16,13.552,-.25,-.231,14,-.25,-8,13.552,-.25,1.694],
// 3 16 13.552 -.25 1.694 14 -.25 -8 14 -.25 8
  [3,16,13.552,-.25,1.694,14,-.25,-8,14,-.25,8],
// 3 16 13.552 -.25 1.694 14 -.25 8 13.552 -.25 3.388
  [3,16,13.552,-.25,1.694,14,-.25,8,13.552,-.25,3.388],
// 3 16 13.552 -.25 3.388 14 -.25 8 13.552 -.25 5.313
  [3,16,13.552,-.25,3.388,14,-.25,8,13.552,-.25,5.313],
// 3 16 13.552 -.25 5.313 14 -.25 8 6.16 -.25 6.468
  [3,16,13.552,-.25,5.313,14,-.25,8,6.16,-.25,6.468],
// 3 16 6.16 -.25 6.468 14 -.25 8 0 -.25 6.468
  [3,16,6.16,-.25,6.468,14,-.25,8,0,-.25,6.468],
// 3 16 0 -.25 6.468 14 -.25 8 -14 -.25 8
  [3,16,0,-.25,6.468,14,-.25,8,-14,-.25,8],
// 3 16 0 -.25 6.468 -14 -.25 8 -6.16 -.25 6.468
  [3,16,0,-.25,6.468,-14,-.25,8,-6.16,-.25,6.468],
// 3 16 -6.16 -.25 6.468 -14 -.25 8 -13.552 -.25 5.313
  [3,16,-6.16,-.25,6.468,-14,-.25,8,-13.552,-.25,5.313],
// 3 16 -13.552 -.25 5.313 -14 -.25 8 -13.552 -.25 3.388
  [3,16,-13.552,-.25,5.313,-14,-.25,8,-13.552,-.25,3.388],
// 3 16 -13.552 -.25 3.388 -14 -.25 8 -13.552 -.25 1.694
  [3,16,-13.552,-.25,3.388,-14,-.25,8,-13.552,-.25,1.694],
// 3 16 -13.552 -.25 1.694 -14 -.25 8 -13.552 -.25 -.231
  [3,16,-13.552,-.25,1.694,-14,-.25,8,-13.552,-.25,-.231],
// 3 16 -13.552 -.25 -.231 -14 -.25 8 -14 -.25 -8
  [3,16,-13.552,-.25,-.231,-14,-.25,8,-14,-.25,-8],
// 3 16 -13.552 -.25 -.231 -14 -.25 -8 -13.552 -.25 -1.925
  [3,16,-13.552,-.25,-.231,-14,-.25,-8,-13.552,-.25,-1.925],
// 3 16 -13.552 -.25 -1.925 -14 -.25 -8 -13.552 -.25 -3.85
  [3,16,-13.552,-.25,-1.925,-14,-.25,-8,-13.552,-.25,-3.85],
// 3 16 -13.552 -.25 -3.85 -14 -.25 -8 0 -.25 -6.2601
  [3,16,-13.552,-.25,-3.85,-14,-.25,-8,0,-.25,-6.2601],
// 3 16 0 -.25 -6.2601 -14 -.25 -8 14 -.25 -8
  [3,16,0,-.25,-6.2601,-14,-.25,-8,14,-.25,-8],
// 3 16 0 -.25 -6.2601 14 -.25 -8 13.552 -.25 -3.85
  [3,16,0,-.25,-6.2601,14,-.25,-8,13.552,-.25,-3.85],
// 
// 1 16 0 -.25 0 .77 0 0 0 1 0 0 0 .77 s\169625as02.dat
  [1,16,0,-.25,0,.77,0,0,0,1,0,0,0,.77, ldraw_lib__s__169625as02()],
// 1 16 0 -.25 0 -.77 0 0 0 1 0 0 0 .77 s\169625as02.dat
  [1,16,0,-.25,0,-.77,0,0,0,1,0,0,0,.77, ldraw_lib__s__169625as02()],
// 
// 1 16 0 -.25 0 .77 0 0 0 1 0 0 0 .77 s\169625as01.dat
  [1,16,0,-.25,0,.77,0,0,0,1,0,0,0,.77, ldraw_lib__s__169625as01()],
// 1 16 0 -.25 0 -.77 0 0 0 1 0 0 0 .77 s\169625as01.dat
  [1,16,0,-.25,0,-.77,0,0,0,1,0,0,0,.77, ldraw_lib__s__169625as01()],
];
module ldraw_lib__169625a(step=0, col=false, unit=2/5, alt=false, line=0.2, solid=!$preview)
    makepoly(ldraw_lib__169625a(), step=step, col=col, unit=unit, alt=alt, line=line, solid=solid);
ldraw_lib__169625a(line=0.2);
// main file
use <../lib.scad>
use <169625a.scad>
use <4865a.scad>
function ldraw_lib__4865ad0e() = [
// 0 Panel  1 x  2 x  1 with Coastguard Logo Sticker
// 0 Name: 4865ad0e.dat
// 0 Author: Takeshi Takahashi [RainbowDolphin]
// 0 !LDRAW_ORG Shortcut UPDATE 2026-05
// 0 !LICENSE Licensed under CC BY 4.0 : see CAreadme.txt
// 
// 0 BFC CERTIFY CCW
  [0,"BFC","CERTIFY"],
  [0,"BFC","CCW"],
// 
// 0 !CATEGORY Sticker Shortcut
// 
// 0 !KEYWORDS Bricklink 4865pb041, Hurricane harbor, Set 6338, town
// 
// 0 !PREVIEW 16 0 0 0 -1 0 0 0 1 0 0 0 -1
// 
// 0 !HISTORY 2026-05-31 [OrionP] Official Update 2026-05
// 
// 1 16 0 0 0 1 0 0 0 1 0 0 0 1 4865a.dat
  [1,16,0,0,0,1,0,0,0,1,0,0,0,1, ldraw_lib__4865a()],
// 1 16 0 12 10 -1 0 0 0 0 -1 0 -1 0 169625a.dat
  [1,16,0,12,10,-1,0,0,0,0,-1,0,-1,0, ldraw_lib__169625a()],
];
module ldraw_lib__4865ad0e(step=0, col=false, unit=2/5, alt=false, line=0.2, solid=!$preview)
    makepoly(ldraw_lib__4865ad0e(), step=step, col=col, unit=unit, alt=alt, line=line, solid=solid);
ldraw_lib__4865ad0e(line=0.2);
